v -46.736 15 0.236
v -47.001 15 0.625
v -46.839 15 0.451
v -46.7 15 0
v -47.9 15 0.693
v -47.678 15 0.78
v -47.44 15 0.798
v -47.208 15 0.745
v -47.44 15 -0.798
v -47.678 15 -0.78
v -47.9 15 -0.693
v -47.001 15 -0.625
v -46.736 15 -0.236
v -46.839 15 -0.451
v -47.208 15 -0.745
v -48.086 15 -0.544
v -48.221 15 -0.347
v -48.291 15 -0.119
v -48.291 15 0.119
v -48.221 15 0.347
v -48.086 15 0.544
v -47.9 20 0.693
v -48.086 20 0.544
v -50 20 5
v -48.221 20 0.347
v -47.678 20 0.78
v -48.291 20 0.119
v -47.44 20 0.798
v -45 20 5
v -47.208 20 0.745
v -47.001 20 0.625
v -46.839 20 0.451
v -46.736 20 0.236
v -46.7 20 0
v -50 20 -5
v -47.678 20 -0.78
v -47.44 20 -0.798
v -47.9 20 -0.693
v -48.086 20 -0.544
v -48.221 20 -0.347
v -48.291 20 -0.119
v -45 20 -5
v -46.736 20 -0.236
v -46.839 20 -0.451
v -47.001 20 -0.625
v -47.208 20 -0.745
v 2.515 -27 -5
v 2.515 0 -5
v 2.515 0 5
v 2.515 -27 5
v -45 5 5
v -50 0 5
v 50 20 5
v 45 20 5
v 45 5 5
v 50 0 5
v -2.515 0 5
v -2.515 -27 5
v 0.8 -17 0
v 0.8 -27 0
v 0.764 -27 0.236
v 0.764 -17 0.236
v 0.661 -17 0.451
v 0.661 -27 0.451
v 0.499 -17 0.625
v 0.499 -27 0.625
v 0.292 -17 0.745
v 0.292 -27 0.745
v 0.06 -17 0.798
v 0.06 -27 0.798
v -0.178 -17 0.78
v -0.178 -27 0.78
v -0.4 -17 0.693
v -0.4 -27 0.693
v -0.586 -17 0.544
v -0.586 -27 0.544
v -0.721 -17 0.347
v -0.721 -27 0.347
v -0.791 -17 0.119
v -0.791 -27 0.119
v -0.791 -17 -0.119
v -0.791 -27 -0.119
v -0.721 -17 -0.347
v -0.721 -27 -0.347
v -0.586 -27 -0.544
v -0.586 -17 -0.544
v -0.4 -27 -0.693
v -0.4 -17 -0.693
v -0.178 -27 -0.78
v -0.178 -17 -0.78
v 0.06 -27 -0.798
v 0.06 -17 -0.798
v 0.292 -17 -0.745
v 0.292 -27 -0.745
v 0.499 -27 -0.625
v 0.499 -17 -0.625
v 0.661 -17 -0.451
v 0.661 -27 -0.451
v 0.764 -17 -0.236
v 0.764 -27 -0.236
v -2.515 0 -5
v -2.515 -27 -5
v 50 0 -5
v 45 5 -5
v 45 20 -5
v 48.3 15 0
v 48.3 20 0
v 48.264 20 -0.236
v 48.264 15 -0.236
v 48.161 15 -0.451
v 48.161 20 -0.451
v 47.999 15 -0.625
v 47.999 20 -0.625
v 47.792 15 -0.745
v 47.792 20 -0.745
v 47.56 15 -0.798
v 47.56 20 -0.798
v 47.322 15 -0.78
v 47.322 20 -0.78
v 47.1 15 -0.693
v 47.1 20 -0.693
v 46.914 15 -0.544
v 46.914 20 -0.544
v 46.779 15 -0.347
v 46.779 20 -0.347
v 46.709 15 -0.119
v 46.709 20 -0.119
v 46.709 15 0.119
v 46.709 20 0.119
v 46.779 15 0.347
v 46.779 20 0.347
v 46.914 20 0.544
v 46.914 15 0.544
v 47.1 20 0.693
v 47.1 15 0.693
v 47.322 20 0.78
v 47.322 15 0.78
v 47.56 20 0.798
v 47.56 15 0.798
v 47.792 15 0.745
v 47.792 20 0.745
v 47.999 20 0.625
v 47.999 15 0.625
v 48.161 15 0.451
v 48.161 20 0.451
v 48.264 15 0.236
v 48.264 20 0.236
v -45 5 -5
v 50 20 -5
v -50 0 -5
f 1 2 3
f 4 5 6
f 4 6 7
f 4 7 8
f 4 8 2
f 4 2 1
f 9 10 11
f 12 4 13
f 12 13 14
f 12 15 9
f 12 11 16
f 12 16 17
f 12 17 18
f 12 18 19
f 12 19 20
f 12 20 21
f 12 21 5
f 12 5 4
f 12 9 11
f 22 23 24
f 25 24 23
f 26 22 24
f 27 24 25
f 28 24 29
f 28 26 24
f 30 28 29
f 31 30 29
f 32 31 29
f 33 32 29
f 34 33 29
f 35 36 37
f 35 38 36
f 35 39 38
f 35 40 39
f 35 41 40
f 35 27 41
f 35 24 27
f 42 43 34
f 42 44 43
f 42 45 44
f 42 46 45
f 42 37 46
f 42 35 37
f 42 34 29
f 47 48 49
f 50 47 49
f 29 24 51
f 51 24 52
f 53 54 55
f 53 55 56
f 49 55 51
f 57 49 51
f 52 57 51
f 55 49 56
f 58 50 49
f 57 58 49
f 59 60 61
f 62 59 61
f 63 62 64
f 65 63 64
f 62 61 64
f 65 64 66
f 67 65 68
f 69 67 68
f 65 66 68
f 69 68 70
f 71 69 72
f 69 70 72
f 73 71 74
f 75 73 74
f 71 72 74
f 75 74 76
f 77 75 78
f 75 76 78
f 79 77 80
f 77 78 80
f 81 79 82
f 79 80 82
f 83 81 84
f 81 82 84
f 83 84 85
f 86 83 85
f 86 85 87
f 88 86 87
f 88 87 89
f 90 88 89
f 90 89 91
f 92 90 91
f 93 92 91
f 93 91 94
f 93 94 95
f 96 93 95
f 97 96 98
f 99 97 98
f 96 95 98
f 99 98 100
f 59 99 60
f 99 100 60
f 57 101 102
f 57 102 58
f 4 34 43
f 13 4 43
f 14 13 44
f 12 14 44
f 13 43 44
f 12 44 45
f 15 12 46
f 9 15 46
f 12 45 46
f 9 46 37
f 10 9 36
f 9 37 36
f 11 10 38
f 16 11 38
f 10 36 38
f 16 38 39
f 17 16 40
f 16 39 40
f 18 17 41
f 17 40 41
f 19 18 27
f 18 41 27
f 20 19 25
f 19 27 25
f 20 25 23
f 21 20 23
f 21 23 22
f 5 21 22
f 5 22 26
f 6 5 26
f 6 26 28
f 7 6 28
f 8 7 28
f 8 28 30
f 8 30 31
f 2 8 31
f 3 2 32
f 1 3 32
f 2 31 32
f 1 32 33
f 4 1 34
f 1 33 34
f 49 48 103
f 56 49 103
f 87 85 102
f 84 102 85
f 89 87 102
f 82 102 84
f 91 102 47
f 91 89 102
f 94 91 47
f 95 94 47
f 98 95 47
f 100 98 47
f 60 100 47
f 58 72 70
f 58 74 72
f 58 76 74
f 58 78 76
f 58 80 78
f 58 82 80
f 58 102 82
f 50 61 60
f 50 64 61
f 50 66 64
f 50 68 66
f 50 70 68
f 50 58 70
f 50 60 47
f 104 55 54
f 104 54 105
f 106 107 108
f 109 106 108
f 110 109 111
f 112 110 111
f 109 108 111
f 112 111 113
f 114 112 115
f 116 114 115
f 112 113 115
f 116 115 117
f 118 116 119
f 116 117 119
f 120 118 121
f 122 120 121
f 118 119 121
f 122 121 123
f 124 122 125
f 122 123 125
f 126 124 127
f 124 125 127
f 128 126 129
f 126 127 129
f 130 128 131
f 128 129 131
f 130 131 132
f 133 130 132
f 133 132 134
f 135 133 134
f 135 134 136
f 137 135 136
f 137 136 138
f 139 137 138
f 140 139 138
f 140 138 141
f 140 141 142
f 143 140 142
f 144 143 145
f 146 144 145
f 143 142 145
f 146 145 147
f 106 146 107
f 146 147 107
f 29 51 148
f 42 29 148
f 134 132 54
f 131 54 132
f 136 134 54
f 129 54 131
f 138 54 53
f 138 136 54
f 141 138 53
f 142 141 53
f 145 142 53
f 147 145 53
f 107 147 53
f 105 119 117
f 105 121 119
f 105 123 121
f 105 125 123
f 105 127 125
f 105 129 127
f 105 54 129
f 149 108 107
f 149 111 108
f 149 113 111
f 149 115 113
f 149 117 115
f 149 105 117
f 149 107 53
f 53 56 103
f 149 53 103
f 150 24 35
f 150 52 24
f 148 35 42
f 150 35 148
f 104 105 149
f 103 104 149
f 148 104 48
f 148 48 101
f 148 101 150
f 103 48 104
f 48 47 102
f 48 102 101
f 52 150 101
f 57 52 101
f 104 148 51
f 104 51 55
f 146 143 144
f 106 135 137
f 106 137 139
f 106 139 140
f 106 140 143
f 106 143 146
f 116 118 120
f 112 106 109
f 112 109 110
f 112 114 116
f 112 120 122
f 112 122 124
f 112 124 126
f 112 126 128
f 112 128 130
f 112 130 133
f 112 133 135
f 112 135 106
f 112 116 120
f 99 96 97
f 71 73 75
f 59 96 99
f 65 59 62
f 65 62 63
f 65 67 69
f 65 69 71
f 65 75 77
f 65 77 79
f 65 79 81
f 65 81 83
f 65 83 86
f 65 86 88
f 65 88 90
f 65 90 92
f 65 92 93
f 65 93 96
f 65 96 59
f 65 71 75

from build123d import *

# Parameters (mm, degrees)
CROQUIS1_W              = 100
CROQUIS1_H              = 10
SALIENTE_EXTRUIR1_DEPTH = 5
CROQUIS2_W              = 5
CROQUIS2_H              = 10
SALIENTE_EXTRUIR2_DEPTH = 15
CROQUIS3_R              = 0.8
CORTAR_EXTRUIR1_DEPTH   = 5
CROQUIS4_W              = 5.029184128
CROQUIS4_H              = 10
SALIENTE_EXTRUIR3_DEPTH = 27
CROQUIS5_R              = 0.8
CORTAR_EXTRUIR2_DEPTH   = 10


with BuildPart() as part:
    # Croquis1 → Saliente-Extruir1 (new body)
    with BuildSketch(Plane(origin=(0, 0, 0), x_dir=(1, 0, 0), z_dir=(0, 1, 0))):
        Rectangle(CROQUIS1_W, CROQUIS1_H)
    extrude(amount=SALIENTE_EXTRUIR1_DEPTH)

    # Croquis2 → Saliente-Extruir2 (add)
    with BuildSketch(Plane(origin=(0, 5, 0), x_dir=(1, 0, 0), z_dir=(0, 1, 0))):
        with Locations((-47.5, 0)):
            Rectangle(CROQUIS2_W, CROQUIS2_H)
        with Locations((47.5, 0)):
            Rectangle(CROQUIS2_W, CROQUIS2_H)
    extrude(amount=SALIENTE_EXTRUIR2_DEPTH)

    # Croquis3 → Cortar-Extruir1 (cut)
    with BuildSketch(Plane(origin=(0, 20, 0), x_dir=(1, 0, 0), z_dir=(0, 1, 0))):
        with Locations((-47.5, 0)):
            Circle(CROQUIS3_R)
        with Locations((47.5, 0)):
            Circle(CROQUIS3_R)
    extrude(amount=-CORTAR_EXTRUIR1_DEPTH, mode=Mode.SUBTRACT)

    # Croquis4 → Saliente-Extruir3 (add)
    with BuildSketch(Plane.XZ):
        Rectangle(CROQUIS4_W, CROQUIS4_H)
    extrude(amount=SALIENTE_EXTRUIR3_DEPTH)

    # Croquis5 → Cortar-Extruir2 (cut)
    with BuildSketch(Plane.XZ.offset(27)):
        Circle(CROQUIS5_R)
    extrude(amount=-CORTAR_EXTRUIR2_DEPTH, mode=Mode.SUBTRACT)


solid = part.part
